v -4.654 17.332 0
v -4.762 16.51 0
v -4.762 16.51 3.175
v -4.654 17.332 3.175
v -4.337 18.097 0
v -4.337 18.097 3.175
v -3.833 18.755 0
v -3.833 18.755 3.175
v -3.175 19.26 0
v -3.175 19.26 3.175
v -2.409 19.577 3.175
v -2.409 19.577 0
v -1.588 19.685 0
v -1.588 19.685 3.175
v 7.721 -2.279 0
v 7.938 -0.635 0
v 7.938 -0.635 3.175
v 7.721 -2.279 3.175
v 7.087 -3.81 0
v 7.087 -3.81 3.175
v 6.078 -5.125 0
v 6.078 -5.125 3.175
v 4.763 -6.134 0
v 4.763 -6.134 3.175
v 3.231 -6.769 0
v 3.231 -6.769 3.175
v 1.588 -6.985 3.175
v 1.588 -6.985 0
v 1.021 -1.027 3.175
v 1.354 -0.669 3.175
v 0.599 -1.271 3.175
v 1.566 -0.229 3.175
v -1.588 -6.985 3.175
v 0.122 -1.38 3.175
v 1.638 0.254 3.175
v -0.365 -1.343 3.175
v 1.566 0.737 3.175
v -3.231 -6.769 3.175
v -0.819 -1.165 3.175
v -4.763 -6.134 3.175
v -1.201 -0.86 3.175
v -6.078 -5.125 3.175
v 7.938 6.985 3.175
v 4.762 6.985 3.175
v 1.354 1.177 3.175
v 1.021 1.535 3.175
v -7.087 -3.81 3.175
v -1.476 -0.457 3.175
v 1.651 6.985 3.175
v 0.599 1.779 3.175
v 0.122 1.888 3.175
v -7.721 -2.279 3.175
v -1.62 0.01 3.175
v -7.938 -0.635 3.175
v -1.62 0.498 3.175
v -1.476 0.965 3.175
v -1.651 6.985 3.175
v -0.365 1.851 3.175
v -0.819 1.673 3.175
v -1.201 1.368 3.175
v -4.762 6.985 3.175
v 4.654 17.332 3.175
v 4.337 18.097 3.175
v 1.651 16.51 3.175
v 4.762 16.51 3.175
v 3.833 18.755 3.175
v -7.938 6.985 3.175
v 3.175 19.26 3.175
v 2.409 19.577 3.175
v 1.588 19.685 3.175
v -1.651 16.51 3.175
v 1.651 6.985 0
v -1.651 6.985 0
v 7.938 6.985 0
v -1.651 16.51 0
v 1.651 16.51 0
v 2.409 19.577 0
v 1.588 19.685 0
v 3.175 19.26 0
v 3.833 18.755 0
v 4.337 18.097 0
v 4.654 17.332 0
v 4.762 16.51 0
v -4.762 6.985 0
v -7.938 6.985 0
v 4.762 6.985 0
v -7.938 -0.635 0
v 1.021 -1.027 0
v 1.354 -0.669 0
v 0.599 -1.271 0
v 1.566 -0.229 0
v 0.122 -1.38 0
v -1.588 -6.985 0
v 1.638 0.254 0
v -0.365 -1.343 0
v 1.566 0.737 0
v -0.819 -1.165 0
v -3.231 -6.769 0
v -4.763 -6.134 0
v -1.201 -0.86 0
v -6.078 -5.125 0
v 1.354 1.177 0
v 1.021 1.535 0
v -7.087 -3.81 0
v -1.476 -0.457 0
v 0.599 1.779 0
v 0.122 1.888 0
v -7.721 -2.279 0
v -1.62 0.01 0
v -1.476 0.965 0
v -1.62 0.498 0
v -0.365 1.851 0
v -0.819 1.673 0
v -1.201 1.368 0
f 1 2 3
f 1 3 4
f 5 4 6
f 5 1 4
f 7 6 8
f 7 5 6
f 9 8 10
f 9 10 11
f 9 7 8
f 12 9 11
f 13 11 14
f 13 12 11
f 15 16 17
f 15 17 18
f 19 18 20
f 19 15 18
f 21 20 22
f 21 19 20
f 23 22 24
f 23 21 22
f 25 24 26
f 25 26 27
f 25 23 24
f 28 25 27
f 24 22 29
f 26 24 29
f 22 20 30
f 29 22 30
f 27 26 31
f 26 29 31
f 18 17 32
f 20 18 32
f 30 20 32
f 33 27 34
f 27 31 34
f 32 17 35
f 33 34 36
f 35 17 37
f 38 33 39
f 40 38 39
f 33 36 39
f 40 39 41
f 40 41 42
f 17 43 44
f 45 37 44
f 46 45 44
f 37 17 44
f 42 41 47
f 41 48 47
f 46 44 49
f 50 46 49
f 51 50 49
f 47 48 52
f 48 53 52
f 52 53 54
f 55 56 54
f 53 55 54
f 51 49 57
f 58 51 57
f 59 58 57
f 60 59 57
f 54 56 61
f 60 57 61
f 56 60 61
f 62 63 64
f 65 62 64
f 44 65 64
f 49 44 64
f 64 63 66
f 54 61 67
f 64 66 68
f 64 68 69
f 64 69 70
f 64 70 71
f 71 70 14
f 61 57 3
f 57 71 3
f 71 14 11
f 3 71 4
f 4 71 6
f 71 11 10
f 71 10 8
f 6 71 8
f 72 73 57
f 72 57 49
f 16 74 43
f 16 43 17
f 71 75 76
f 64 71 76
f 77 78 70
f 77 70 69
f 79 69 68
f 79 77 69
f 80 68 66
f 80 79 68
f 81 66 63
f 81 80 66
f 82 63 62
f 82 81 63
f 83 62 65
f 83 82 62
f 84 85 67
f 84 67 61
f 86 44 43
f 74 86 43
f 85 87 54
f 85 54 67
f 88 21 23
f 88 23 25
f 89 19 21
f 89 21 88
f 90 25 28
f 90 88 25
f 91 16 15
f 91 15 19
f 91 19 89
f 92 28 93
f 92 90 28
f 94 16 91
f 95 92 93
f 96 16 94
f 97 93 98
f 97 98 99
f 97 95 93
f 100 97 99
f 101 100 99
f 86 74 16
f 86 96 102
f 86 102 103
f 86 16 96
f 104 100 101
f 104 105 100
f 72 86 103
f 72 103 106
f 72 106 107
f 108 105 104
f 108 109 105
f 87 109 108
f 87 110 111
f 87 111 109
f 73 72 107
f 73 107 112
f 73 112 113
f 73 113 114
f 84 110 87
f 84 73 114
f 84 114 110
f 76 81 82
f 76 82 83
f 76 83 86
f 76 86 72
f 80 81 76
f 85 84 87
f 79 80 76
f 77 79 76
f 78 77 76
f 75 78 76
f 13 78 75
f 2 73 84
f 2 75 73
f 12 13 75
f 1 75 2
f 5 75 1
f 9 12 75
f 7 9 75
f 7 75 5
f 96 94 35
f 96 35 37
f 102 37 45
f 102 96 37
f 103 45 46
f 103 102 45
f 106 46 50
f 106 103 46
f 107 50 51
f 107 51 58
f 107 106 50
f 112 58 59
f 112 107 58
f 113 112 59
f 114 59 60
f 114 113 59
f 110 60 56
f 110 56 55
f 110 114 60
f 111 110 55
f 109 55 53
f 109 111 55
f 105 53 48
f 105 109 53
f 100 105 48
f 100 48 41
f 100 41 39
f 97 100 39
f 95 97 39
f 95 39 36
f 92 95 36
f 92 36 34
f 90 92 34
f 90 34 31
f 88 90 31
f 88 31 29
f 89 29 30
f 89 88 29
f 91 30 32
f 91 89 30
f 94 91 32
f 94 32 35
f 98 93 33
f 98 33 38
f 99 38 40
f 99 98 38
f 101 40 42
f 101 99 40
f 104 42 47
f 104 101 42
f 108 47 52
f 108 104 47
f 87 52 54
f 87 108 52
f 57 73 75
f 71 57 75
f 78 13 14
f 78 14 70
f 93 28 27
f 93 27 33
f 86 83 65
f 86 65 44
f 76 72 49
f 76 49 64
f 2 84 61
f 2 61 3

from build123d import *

# Parameters (mm, degrees)
SKETCH1_R           = 1.6383
SKETCH1_W           = 3.302
SKETCH1_H           = 9.525
BOSS_EXTRUDE1_DEPTH = 3.175


with BuildPart() as part:
    # Sketch1 → Boss-Extrude1 (new body)
    with BuildSketch(Plane.XY):
        with BuildLine():
            Line((-1.5875, 19.685), (1.5875, 19.685))
            ThreePointArc((1.5875, 19.685), (3.83256403, 18.75506403), (4.7625, 16.51))
            Line((4.7625, 16.51), (4.7625, 6.985))
            Line((4.7625, 6.985), (7.9375, 6.985))
            Line((7.9375, 6.985), (7.9375, -0.635))
            ThreePointArc((7.9375, -0.635), (6.077628061, -5.125128061), (1.5875, -6.985))
            Line((1.5875, -6.985), (-1.5875, -6.985))
            ThreePointArc((-1.5875, -6.985), (-6.077628061, -5.125128061), (-7.9375, -0.635))
            Line((-7.9375, -0.635), (-7.9375, 6.985))
            Line((-7.9375, 6.985), (-4.7625, 6.985))
            Line((-4.7625, 6.985), (-4.7625, 16.51))
            ThreePointArc((-4.7625, 16.51), (-3.83256403, 18.75506403), (-1.5875, 19.685))
        make_face()
        with Locations((0, 0.254)):
            Circle(SKETCH1_R, mode=Mode.SUBTRACT)
        with Locations((0, 11.7475)):
            Rectangle(SKETCH1_W, SKETCH1_H, mode=Mode.SUBTRACT)
    extrude(amount=BOSS_EXTRUDE1_DEPTH)


solid = part.part
